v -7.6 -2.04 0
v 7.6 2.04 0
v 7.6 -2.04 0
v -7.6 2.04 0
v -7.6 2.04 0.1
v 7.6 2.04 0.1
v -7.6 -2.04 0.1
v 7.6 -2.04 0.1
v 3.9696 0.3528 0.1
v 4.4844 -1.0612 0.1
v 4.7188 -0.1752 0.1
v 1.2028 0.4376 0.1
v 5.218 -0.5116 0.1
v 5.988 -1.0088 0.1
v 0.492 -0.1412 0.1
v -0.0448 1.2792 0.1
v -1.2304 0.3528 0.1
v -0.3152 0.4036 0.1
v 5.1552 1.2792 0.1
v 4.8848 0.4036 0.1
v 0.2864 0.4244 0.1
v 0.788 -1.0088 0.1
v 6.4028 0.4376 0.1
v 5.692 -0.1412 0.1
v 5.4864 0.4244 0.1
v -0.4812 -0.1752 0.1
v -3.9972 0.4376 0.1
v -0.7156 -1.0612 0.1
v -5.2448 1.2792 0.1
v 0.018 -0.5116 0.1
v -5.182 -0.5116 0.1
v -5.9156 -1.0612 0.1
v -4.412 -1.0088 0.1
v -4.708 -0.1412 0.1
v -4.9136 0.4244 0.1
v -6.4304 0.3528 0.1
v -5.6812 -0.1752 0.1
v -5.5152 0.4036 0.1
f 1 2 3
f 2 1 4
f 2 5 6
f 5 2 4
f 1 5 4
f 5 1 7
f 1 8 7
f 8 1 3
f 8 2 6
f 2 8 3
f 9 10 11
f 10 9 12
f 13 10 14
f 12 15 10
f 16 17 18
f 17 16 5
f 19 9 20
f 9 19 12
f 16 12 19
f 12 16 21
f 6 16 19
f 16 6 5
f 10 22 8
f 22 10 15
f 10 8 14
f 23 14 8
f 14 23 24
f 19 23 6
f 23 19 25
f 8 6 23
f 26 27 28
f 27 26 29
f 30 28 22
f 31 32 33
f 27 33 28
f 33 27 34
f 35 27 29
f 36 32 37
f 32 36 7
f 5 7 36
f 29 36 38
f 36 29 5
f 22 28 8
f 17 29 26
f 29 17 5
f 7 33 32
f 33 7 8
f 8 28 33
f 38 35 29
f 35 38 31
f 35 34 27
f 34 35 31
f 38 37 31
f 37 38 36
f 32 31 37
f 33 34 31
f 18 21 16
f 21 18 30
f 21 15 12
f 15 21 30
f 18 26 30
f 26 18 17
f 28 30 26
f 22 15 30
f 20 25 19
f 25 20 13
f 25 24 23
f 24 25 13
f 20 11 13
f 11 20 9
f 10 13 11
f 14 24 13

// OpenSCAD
// file: ../p/4-4edge.scad
use <../lib.scad>
$fa=1; $fs=0.2;
function ldraw_lib__4_4edge(realsolid=false) = [
// 0 Circle 1.0
// 0 Name: 4-4edge.dat
// 0 Author: James Jessiman
// 0 !LDRAW_ORG Primitive UPDATE 2017-01
// 0 !LICENSE Licensed under CC BY 2.0 and CC BY 4.0 : see CAreadme.txt
// 
// 0 BFC CERTIFY CCW
  [0,"BFC","CERTIFY"],
  [0,"BFC","CCW"],
// 
// 0 !HISTORY 1998-12-15 [PTadmin] Official Update 1998-10
// 0 !HISTORY 2005-12-28 [PTadmin] Official Update 2005-01
// 0 !HISTORY 2007-06-24 [PTadmin] Header formatted for Contributor Agreement
// 0 !HISTORY 2008-07-01 [PTadmin] Official Update 2008-01
// 0 !HISTORY 2017-01-15 [Steffen] BFCed
// 0 !HISTORY 2017-12-30 [PTadmin] Official Update 2017-01
// 
// 
// 2 24 1 0 0 0.9239 0 0.3827
  [2,24,1,0,0,0.9239,0,0.3827],
// 2 24 0.9239 0 0.3827 0.7071 0 0.7071
  [2,24,0.9239,0,0.3827,0.7071,0,0.7071],
// 2 24 0.7071 0 0.7071 0.3827 0 0.9239
  [2,24,0.7071,0,0.7071,0.3827,0,0.9239],
// 2 24 0.3827 0 0.9239 0 0 1
  [2,24,0.3827,0,0.9239,0,0,1],
// 2 24 0 0 1 -0.3827 0 0.9239
  [2,24,0,0,1,-0.3827,0,0.9239],
// 2 24 -0.3827 0 0.9239 -0.7071 0 0.7071
  [2,24,-0.3827,0,0.9239,-0.7071,0,0.7071],
// 2 24 -0.7071 0 0.7071 -0.9239 0 0.3827
  [2,24,-0.7071,0,0.7071,-0.9239,0,0.3827],
// 2 24 -0.9239 0 0.3827 -1 0 -0
  [2,24,-0.9239,0,0.3827,-1,0,-0],
// 2 24 -1 0 -0 -0.9239 0 -0.3827
  [2,24,-1,0,-0,-0.9239,0,-0.3827],
// 2 24 -0.9239 0 -0.3827 -0.7071 0 -0.7071
  [2,24,-0.9239,0,-0.3827,-0.7071,0,-0.7071],
// 2 24 -0.7071 0 -0.7071 -0.3827 0 -0.9239
  [2,24,-0.7071,0,-0.7071,-0.3827,0,-0.9239],
// 2 24 -0.3827 0 -0.9239 0 0 -1
  [2,24,-0.3827,0,-0.9239,0,0,-1],
// 2 24 0 0 -1 0.3827 0 -0.9239
  [2,24,0,0,-1,0.3827,0,-0.9239],
// 2 24 0.3827 0 -0.9239 0.7071 0 -0.7071
  [2,24,0.3827,0,-0.9239,0.7071,0,-0.7071],
// 2 24 0.7071 0 -0.7071 0.9239 0 -0.3827
  [2,24,0.7071,0,-0.7071,0.9239,0,-0.3827],
// 2 24 0.9239 0 -0.3827 1 0 0
  [2,24,0.9239,0,-0.3827,1,0,0],
];
module ldraw_lib__4_4edge(step=0, col=false, unit=2/5, alt=false, line=0.2, solid=!$preview)
    makepoly(ldraw_lib__4_4edge(solid), step=step, col=col, unit=unit, alt=alt, line=line, solid=solid);
ldraw_lib__4_4edge(line=0.2);
// file: ../p/4-4disc.scad
use <../lib.scad>
$fa=1; $fs=0.2;
function ldraw_lib__4_4disc(realsolid=false) = [
// 0 Disc 1.0
// 0 Name: 4-4disc.dat
// 0 Author: James Jessiman
// 0 !LDRAW_ORG Primitive UPDATE 2002-02
// 0 !LICENSE Licensed under CC BY 2.0 and CC BY 4.0 : see CAreadme.txt
// 
// 0 BFC CERTIFY CCW
  [0,"BFC","CERTIFY"],
  [0,"BFC","CCW"],
// 
// 0 !HISTORY 1998-12-15 [PTadmin] Official Update 1998-10
// 0 !HISTORY 2002-03-23 [sbliss] Added BFC statement
// 0 !HISTORY 2002-04-25 [PTadmin] Official Update 2002-02
// 0 !HISTORY 2007-06-24 [PTadmin] Header formatted for Contributor Agreement
// 0 !HISTORY 2008-07-01 [PTadmin] Official Update 2008-01
// 
// 
// 3 16 0 0 0 1 0 0 0.9239 0 0.3827
  [3,16,0,0,0,1,0,0,0.9239,0,0.3827],
// 3 16 0 0 0 0.9239 0 0.3827 0.7071 0 0.7071
  [3,16,0,0,0,0.9239,0,0.3827,0.7071,0,0.7071],
// 3 16 0 0 0 0.7071 0 0.7071 0.3827 0 0.9239
  [3,16,0,0,0,0.7071,0,0.7071,0.3827,0,0.9239],
// 3 16 0 0 0 0.3827 0 0.9239 0 0 1
  [3,16,0,0,0,0.3827,0,0.9239,0,0,1],
// 3 16 0 0 0 0 0 1 -0.3827 0 0.9239
  [3,16,0,0,0,0,0,1,-0.3827,0,0.9239],
// 3 16 0 0 0 -0.3827 0 0.9239 -0.7071 0 0.7071
  [3,16,0,0,0,-0.3827,0,0.9239,-0.7071,0,0.7071],
// 3 16 0 0 0 -0.7071 0 0.7071 -0.9239 0 0.3827
  [3,16,0,0,0,-0.7071,0,0.7071,-0.9239,0,0.3827],
// 3 16 0 0 0 -0.9239 0 0.3827 -1 0 -0
  [3,16,0,0,0,-0.9239,0,0.3827,-1,0,-0],
// 3 16 0 0 0 -1 0 -0 -0.9239 0 -0.3827
  [3,16,0,0,0,-1,0,-0,-0.9239,0,-0.3827],
// 3 16 0 0 0 -0.9239 0 -0.3827 -0.7071 0 -0.7071
  [3,16,0,0,0,-0.9239,0,-0.3827,-0.7071,0,-0.7071],
// 3 16 0 0 0 -0.7071 0 -0.7071 -0.3827 0 -0.9239
  [3,16,0,0,0,-0.7071,0,-0.7071,-0.3827,0,-0.9239],
// 3 16 0 0 0 -0.3827 0 -0.9239 0 0 -1
  [3,16,0,0,0,-0.3827,0,-0.9239,0,0,-1],
// 3 16 0 0 0 0 0 -1 0.3827 0 -0.9239
  [3,16,0,0,0,0,0,-1,0.3827,0,-0.9239],
// 3 16 0 0 0 0.3827 0 -0.9239 0.7071 0 -0.7071
  [3,16,0,0,0,0.3827,0,-0.9239,0.7071,0,-0.7071],
// 3 16 0 0 0 0.7071 0 -0.7071 0.9239 0 -0.3827
  [3,16,0,0,0,0.7071,0,-0.7071,0.9239,0,-0.3827],
// 3 16 0 0 0 0.9239 0 -0.3827 1 0 0
  [3,16,0,0,0,0.9239,0,-0.3827,1,0,0],
// 0
];
module ldraw_lib__4_4disc(step=0, col=false, unit=2/5, alt=false, line=0.2, solid=!$preview)
    makepoly(ldraw_lib__4_4disc(solid), step=step, col=col, unit=unit, alt=alt, line=line, solid=solid);
ldraw_lib__4_4disc(line=0.2);
// file: ../p/4-4cyli.scad
use <../lib.scad>
$fa=1; $fs=0.2;
function ldraw_lib__4_4cyli(realsolid=false) = [
// 0 Cylinder 1.0
// 0 Name: 4-4cyli.dat
// 0 Author: James Jessiman
// 0 !LDRAW_ORG Primitive UPDATE 2005-01
// 0 !LICENSE Licensed under CC BY 2.0 and CC BY 4.0 : see CAreadme.txt
// 
// 0 BFC CERTIFY CCW
  [0,"BFC","CERTIFY"],
  [0,"BFC","CCW"],
// 
// 0 !HISTORY 1998-12-15 [PTadmin] Official Update 1998-10
// 0 !HISTORY 2002-03-23 [sbliss] Added BFC statement; merged headers from files in distributions LDraw 0.27 and Complete.
// 0 !HISTORY 2002-04-25 [PTadmin] Official Update 2002-02
// 0 !HISTORY 2004-12-14 [guyvivan] BFC CCW
// 0 !HISTORY 2005-12-28 [PTadmin] Official Update 2005-01
// 0 !HISTORY 2007-06-24 [PTadmin] Header formatted for Contributor Agreement
// 0 !HISTORY 2008-07-01 [PTadmin] Official Update 2008-01
// 
// 
// 4 16 1 1 0 0.9239 1 0.3827 0.9239 0 0.3827 1 0 0
  [4,16,1,1,0,0.9239,1,0.3827,0.9239,0,0.3827,1,0,0],
// 5 24 1 0 0 1 1 0 0.9239 0 0.3827 0.9239 0 -0.3827
  [5,24,1,0,0,1,1,0,0.9239,0,0.3827,0.9239,0,-0.3827],
// 4 16 0.9239 1 0.3827 0.7071 1 0.7071 0.7071 0 0.7071 0.9239 0 0.3827
  [4,16,0.9239,1,0.3827,0.7071,1,0.7071,0.7071,0,0.7071,0.9239,0,0.3827],
// 5 24 0.9239 0 0.3827 0.9239 1 0.3827 0.7071 0 0.7071 1 0 0
  [5,24,0.9239,0,0.3827,0.9239,1,0.3827,0.7071,0,0.7071,1,0,0],
// 4 16 0.7071 1 0.7071 0.3827 1 0.9239 0.3827 0 0.9239 0.7071 0 0.7071
  [4,16,0.7071,1,0.7071,0.3827,1,0.9239,0.3827,0,0.9239,0.7071,0,0.7071],
// 5 24 0.7071 0 0.7071 0.7071 1 0.7071 0.3827 0 0.9239 0.9239 0 0.3827
  [5,24,0.7071,0,0.7071,0.7071,1,0.7071,0.3827,0,0.9239,0.9239,0,0.3827],
// 4 16 0.3827 1 0.9239 0 1 1 0 0 1 0.3827 0 0.9239
  [4,16,0.3827,1,0.9239,0,1,1,0,0,1,0.3827,0,0.9239],
// 5 24 0.3827 0 0.9239 0.3827 1 0.9239 0 0 1 0.7071 0 0.7071
  [5,24,0.3827,0,0.9239,0.3827,1,0.9239,0,0,1,0.7071,0,0.7071],
// 4 16 0 1 1 -0.3827 1 0.9239 -0.3827 0 0.9239 0 0 1
  [4,16,0,1,1,-0.3827,1,0.9239,-0.3827,0,0.9239,0,0,1],
// 5 24 0 0 1 0 1 1 -0.3827 0 0.9239 0.3827 0 0.9239
  [5,24,0,0,1,0,1,1,-0.3827,0,0.9239,0.3827,0,0.9239],
// 4 16 -0.3827 1 0.9239 -0.7071 1 0.7071 -0.7071 0 0.7071 -0.3827 0 0.9239
  [4,16,-0.3827,1,0.9239,-0.7071,1,0.7071,-0.7071,0,0.7071,-0.3827,0,0.9239],
// 5 24 -0.3827 0 0.9239 -0.3827 1 0.9239 -0.7071 0 0.7071 0 0 1
  [5,24,-0.3827,0,0.9239,-0.3827,1,0.9239,-0.7071,0,0.7071,0,0,1],
// 4 16 -0.7071 1 0.7071 -0.9239 1 0.3827 -0.9239 0 0.3827 -0.7071 0 0.7071
  [4,16,-0.7071,1,0.7071,-0.9239,1,0.3827,-0.9239,0,0.3827,-0.7071,0,0.7071],
// 5 24 -0.7071 0 0.7071 -0.7071 1 0.7071 -0.9239 0 0.3827 -0.3827 0 0.9239
  [5,24,-0.7071,0,0.7071,-0.7071,1,0.7071,-0.9239,0,0.3827,-0.3827,0,0.9239],
// 4 16 -0.9239 1 0.3827 -1 1 0 -1 0 0 -0.9239 0 0.3827
  [4,16,-0.9239,1,0.3827,-1,1,0,-1,0,0,-0.9239,0,0.3827],
// 5 24 -0.9239 0 0.3827 -0.9239 1 0.3827 -1 0 0 -0.7071 0 0.7071
  [5,24,-0.9239,0,0.3827,-0.9239,1,0.3827,-1,0,0,-0.7071,0,0.7071],
// 4 16 -1 1 0 -0.9239 1 -0.3827 -0.9239 0 -0.3827 -1 0 0
  [4,16,-1,1,0,-0.9239,1,-0.3827,-0.9239,0,-0.3827,-1,0,0],
// 5 24 -1 0 0 -1 1 0 -0.9239 0 -0.3827 -0.9239 0 0.3827
  [5,24,-1,0,0,-1,1,0,-0.9239,0,-0.3827,-0.9239,0,0.3827],
// 4 16 -0.9239 1 -0.3827 -0.7071 1 -0.7071 -0.7071 0 -0.7071 -0.9239 0 -0.3827
  [4,16,-0.9239,1,-0.3827,-0.7071,1,-0.7071,-0.7071,0,-0.7071,-0.9239,0,-0.3827],
// 5 24 -0.9239 0 -0.3827 -0.9239 1 -0.3827 -0.7071 0 -0.7071 -1 0 0
  [5,24,-0.9239,0,-0.3827,-0.9239,1,-0.3827,-0.7071,0,-0.7071,-1,0,0],
// 4 16 -0.7071 1 -0.7071 -0.3827 1 -0.9239 -0.3827 0 -0.9239 -0.7071 0 -0.7071
  [4,16,-0.7071,1,-0.7071,-0.3827,1,-0.9239,-0.3827,0,-0.9239,-0.7071,0,-0.7071],
// 5 24 -0.7071 0 -0.7071 -0.7071 1 -0.7071 -0.3827 0 -0.9239 -0.9239 0 -0.3827
  [5,24,-0.7071,0,-0.7071,-0.7071,1,-0.7071,-0.3827,0,-0.9239,-0.9239,0,-0.3827],
// 4 16 -0.3827 1 -0.9239 0 1 -1 0 0 -1 -0.3827 0 -0.9239
  [4,16,-0.3827,1,-0.9239,0,1,-1,0,0,-1,-0.3827,0,-0.9239],
// 5 24 -0.3827 0 -0.9239 -0.3827 1 -0.9239 0 0 -1 -0.7071 0 -0.7071
  [5,24,-0.3827,0,-0.9239,-0.3827,1,-0.9239,0,0,-1,-0.7071,0,-0.7071],
// 4 16 0 1 -1 0.3827 1 -0.9239 0.3827 0 -0.9239 0 0 -1
  [4,16,0,1,-1,0.3827,1,-0.9239,0.3827,0,-0.9239,0,0,-1],
// 5 24 0 0 -1 0 1 -1 0.3827 0 -0.9239 -0.3827 0 -0.9239
  [5,24,0,0,-1,0,1,-1,0.3827,0,-0.9239,-0.3827,0,-0.9239],
// 4 16 0.3827 1 -0.9239 0.7071 1 -0.7071 0.7071 0 -0.7071 0.3827 0 -0.9239
  [4,16,0.3827,1,-0.9239,0.7071,1,-0.7071,0.7071,0,-0.7071,0.3827,0,-0.9239],
// 5 24 0.3827 0 -0.9239 0.3827 1 -0.9239 0.7071 0 -0.7071 0 0 -1
  [5,24,0.3827,0,-0.9239,0.3827,1,-0.9239,0.7071,0,-0.7071,0,0,-1],
// 4 16 0.7071 1 -0.7071 0.9239 1 -0.3827 0.9239 0 -0.3827 0.7071 0 -0.7071
  [4,16,0.7071,1,-0.7071,0.9239,1,-0.3827,0.9239,0,-0.3827,0.7071,0,-0.7071],
// 5 24 0.7071 0 -0.7071 0.7071 1 -0.7071 0.9239 0 -0.3827 0.3827 0 -0.9239
  [5,24,0.7071,0,-0.7071,0.7071,1,-0.7071,0.9239,0,-0.3827,0.3827,0,-0.9239],
// 4 16 0.9239 1 -0.3827 1 1 0 1 0 0 0.9239 0 -0.3827
  [4,16,0.9239,1,-0.3827,1,1,0,1,0,0,0.9239,0,-0.3827],
// 5 24 0.9239 0 -0.3827 0.9239 1 -0.3827 1 0 0 0.7071 0 -0.7071
  [5,24,0.9239,0,-0.3827,0.9239,1,-0.3827,1,0,0,0.7071,0,-0.7071],
// 0
];
module ldraw_lib__4_4cyli(step=0, col=false, unit=2/5, alt=false, line=0.2, solid=!$preview)
    makepoly(ldraw_lib__4_4cyli(solid), step=step, col=col, unit=unit, alt=alt, line=line, solid=solid);
ldraw_lib__4_4cyli(line=0.2);
// file: ../p/stud3.scad
use <../lib.scad>
use <4-4cyli.scad>
use <4-4disc.scad>
use <4-4edge.scad>
$fa=1; $fs=0.2;
function ldraw_lib__stud3(realsolid=false) = realsolid ? 
    [openscad(translate([0,0,-eps()], o=cylinder(4+eps(), r=4)),2)] : [
// 0 Stud Tube Solid
// 0 Name: stud3.dat
// 0 Author: James Jessiman
// 0 !LDRAW_ORG Primitive UPDATE 2012-01
// 0 !LICENSE Licensed under CC BY 2.0 and CC BY 4.0 : see CAreadme.txt
// 
// 0 BFC CERTIFY CCW
  [0,"BFC","CERTIFY"],
  [0,"BFC","CCW"],
// 
// 0 !HISTORY 2002-04-04 [sbliss] Modified for BFC compliance
// 0 !HISTORY 2002-04-25 [PTadmin] Official Update 2002-02
// 0 !HISTORY 2007-06-24 [PTadmin] Header formatted for Contributor Agreement
// 0 !HISTORY 2008-07-01 [PTadmin] Official Update 2008-01
// 0 !HISTORY 2012-02-16 [Philo] Changed to CCW
// 0 !HISTORY 2012-03-30 [PTadmin] Official Update 2012-01
// 
// 
// 1 16 0 -4 0 4 0 0 0 1 0 0 0 4 4-4edge.dat
  [1,16,0,-4,0,4,0,0,0,1,0,0,0,4, ldraw_lib__4_4edge(realsolid)],
// 1 16 0 0 0 4 0 0 0 1 0 0 0 4 4-4edge.dat
  [1,16,0,0,0,4,0,0,0,1,0,0,0,4, ldraw_lib__4_4edge(realsolid)],
// 1 16 0 -4 0 4 0 0 0 1 0 0 0 4 4-4disc.dat
  [1,16,0,-4,0,4,0,0,0,1,0,0,0,4, ldraw_lib__4_4disc(realsolid)],
// 1 16 0 -4 0 4 0 0 0 4 0 0 0 4 4-4cyli.dat
  [1,16,0,-4,0,4,0,0,0,4,0,0,0,4, ldraw_lib__4_4cyli(realsolid)],
];
module ldraw_lib__stud3(step=0, col=false, unit=2/5, alt=false, line=0.2, solid=!$preview)
    makepoly(ldraw_lib__stud3(solid), step=step, col=col, unit=unit, alt=alt, line=line, solid=solid);
ldraw_lib__stud3(line=0.2);
// file: ../p/stud.scad
use <../lib.scad>
use <4-4cyli.scad>
use <4-4disc.scad>
use <4-4edge.scad>
$fa=1; $fs=0.2;
function ldraw_lib__stud(realsolid=false) = realsolid ? 
    [openscad(translate([0,0,-eps()], o=cylinder(4+eps(), r=6)),2)] : [
// 0 Stud
// 0 Name: stud.dat
// 0 Author: James Jessiman
// 0 !LDRAW_ORG Primitive UPDATE 2012-01
// 0 !LICENSE Licensed under CC BY 2.0 and CC BY 4.0 : see CAreadme.txt
// 
// 0 BFC CERTIFY CCW
  [0,"BFC","CERTIFY"],
  [0,"BFC","CCW"],
// 
// 0 !HISTORY 2002-04-04 [sbliss] Modified for BFC compliance
// 0 !HISTORY 2002-04-25 [PTadmin] Official Update 2002-02
// 0 !HISTORY 2007-06-24 [PTadmin] Header formatted for Contributor Agreement
// 0 !HISTORY 2008-07-01 [PTadmin] Official Update 2008-01
// 0 !HISTORY 2012-02-16 [Philo] Changed to CCW
// 0 !HISTORY 2012-03-30 [PTadmin] Official Update 2012-01
// 
// 
// 1 16 0 0 0 6 0 0 0 1 0 0 0 6 4-4edge.dat
  [1,16,0,0,0,6,0,0,0,1,0,0,0,6, ldraw_lib__4_4edge(realsolid)],
// 1 16 0 -4 0 6 0 0 0 1 0 0 0 6 4-4edge.dat
  [1,16,0,-4,0,6,0,0,0,1,0,0,0,6, ldraw_lib__4_4edge(realsolid)],
// 1 16 0 0 0 6 0 0 0 -4 0 0 0 6 4-4cyli.dat
  [1,16,0,0,0,6,0,0,0,-4,0,0,0,6, ldraw_lib__4_4cyli(realsolid)],
// 1 16 0 -4 0 6 0 0 0 1 0 0 0 6 4-4disc.dat
  [1,16,0,-4,0,6,0,0,0,1,0,0,0,6, ldraw_lib__4_4disc(realsolid)],
];
module ldraw_lib__stud(step=0, col=false, unit=2/5, alt=false, line=0.2, solid=!$preview)
    makepoly(ldraw_lib__stud(solid), step=step, col=col, unit=unit, alt=alt, line=line, solid=solid);
ldraw_lib__stud(line=0.2);
// file: ../p/box5.scad
use <../lib.scad>
$fa=1; $fs=0.2;
function ldraw_lib__box5(realsolid=false) = [
// 0 Box with 5 Faces and All Edges
// 0 Name: box5.dat
// 0 Author: James Jessiman
// 0 !LDRAW_ORG Primitive UPDATE 2012-01
// 0 !LICENSE Licensed under CC BY 2.0 and CC BY 4.0 : see CAreadme.txt
// 
// 0 BFC CERTIFY CCW
  [0,"BFC","CERTIFY"],
  [0,"BFC","CCW"],
// 
// 0 !HISTORY 2002-04-03 [sbliss] Modified for BFC compliance
// 0 !HISTORY 2002-04-25 [PTadmin] Official Update 2002-02
// 0 !HISTORY 2007-06-24 [PTadmin] Header formatted for Contributor Agreement
// 0 !HISTORY 2008-07-01 [PTadmin] Official Update 2008-01
// 0 !HISTORY 2012-02-16 [Philo] Changed to CCW
// 0 !HISTORY 2012-03-30 [PTadmin] Official Update 2012-01
// 
// 
// 2 24 1 1 1 -1 1 1
  [2,24,1,1,1,-1,1,1],
// 2 24 -1 1 1 -1 1 -1
  [2,24,-1,1,1,-1,1,-1],
// 2 24 -1 1 -1 1 1 -1
  [2,24,-1,1,-1,1,1,-1],
// 2 24 1 1 -1 1 1 1
  [2,24,1,1,-1,1,1,1],
// 2 24 1 0 1 -1 0 1
  [2,24,1,0,1,-1,0,1],
// 2 24 -1 0 1 -1 0 -1
  [2,24,-1,0,1,-1,0,-1],
// 2 24 -1 0 -1 1 0 -1
  [2,24,-1,0,-1,1,0,-1],
// 2 24 1 0 -1 1 0 1
  [2,24,1,0,-1,1,0,1],
// 2 24 1 0 1 1 1 1
  [2,24,1,0,1,1,1,1],
// 2 24 -1 0 1 -1 1 1
  [2,24,-1,0,1,-1,1,1],
// 2 24 1 0 -1 1 1 -1
  [2,24,1,0,-1,1,1,-1],
// 2 24 -1 0 -1 -1 1 -1
  [2,24,-1,0,-1,-1,1,-1],
// 4 16 -1 1 1 1 1 1 1 1 -1 -1 1 -1
  [4,16,-1,1,1,1,1,1,1,1,-1,-1,1,-1],
// 4 16 -1 1 1 -1 0 1 1 0 1 1 1 1
  [4,16,-1,1,1,-1,0,1,1,0,1,1,1,1],
// 4 16 -1 1 -1 -1 0 -1 -1 0 1 -1 1 1
  [4,16,-1,1,-1,-1,0,-1,-1,0,1,-1,1,1],
// 4 16 1 1 -1 1 0 -1 -1 0 -1 -1 1 -1
  [4,16,1,1,-1,1,0,-1,-1,0,-1,-1,1,-1],
// 4 16 1 1 1 1 0 1 1 0 -1 1 1 -1
  [4,16,1,1,1,1,0,1,1,0,-1,1,1,-1],
];
module ldraw_lib__box5(step=0, col=false, unit=2/5, alt=false, line=0.2, solid=!$preview)
    makepoly(ldraw_lib__box5(solid), step=step, col=col, unit=unit, alt=alt, line=line, solid=solid);
ldraw_lib__box5(line=0.2);
// file: ../p/box4t.scad
use <../lib.scad>
$fa=1; $fs=0.2;
function ldraw_lib__box4t(realsolid=false) = [
// 0 Box with 4 Adjacent Faces and All Edges
// 0 Name: box4t.dat
// 0 Author: Tore Eriksson [Tore_Eriksson]
// 0 !LDRAW_ORG Primitive UPDATE 2003-02
// 0 !LICENSE Licensed under CC BY 2.0 and CC BY 4.0 : see CAreadme.txt
// 
// 0 BFC CERTIFY CCW
  [0,"BFC","CERTIFY"],
  [0,"BFC","CCW"],
// 
// 0 !HISTORY 1997-09-29 [PTadmin] Official Update 1997-15
// 0 !HISTORY 2002-08-31 [izanette] Modified with WINDZ for BFC compliance
// 0 !HISTORY 2003-08-01 [PTadmin] Official Update 2003-02
// 0 !HISTORY 2007-06-24 [PTadmin] Header formatted for Contributor Agreement
// 0 !HISTORY 2008-07-01 [PTadmin] Official Update 2008-01
// 
// 
// 2 24 1 1 1 -1 1 1
  [2,24,1,1,1,-1,1,1],
// 2 24 -1 1 1 -1 1 -1
  [2,24,-1,1,1,-1,1,-1],
// 2 24 -1 1 -1 1 1 -1
  [2,24,-1,1,-1,1,1,-1],
// 2 24 1 1 -1 1 1 1
  [2,24,1,1,-1,1,1,1],
// 2 24 1 0 1 -1 0 1
  [2,24,1,0,1,-1,0,1],
// 2 24 -1 0 1 -1 0 -1
  [2,24,-1,0,1,-1,0,-1],
// 2 24 -1 0 -1 1 0 -1
  [2,24,-1,0,-1,1,0,-1],
// 2 24 1 0 -1 1 0 1
  [2,24,1,0,-1,1,0,1],
// 2 24 1 0 1 1 1 1
  [2,24,1,0,1,1,1,1],
// 2 24 -1 0 1 -1 1 1
  [2,24,-1,0,1,-1,1,1],
// 2 24 1 0 -1 1 1 -1
  [2,24,1,0,-1,1,1,-1],
// 2 24 -1 0 -1 -1 1 -1
  [2,24,-1,0,-1,-1,1,-1],
// 4 16 1 1 1 1 1 -1 -1 1 -1 -1 1 1
  [4,16,1,1,1,1,1,-1,-1,1,-1,-1,1,1],
// 4 16 1 1 1 -1 1 1 -1 0 1 1 0 1
  [4,16,1,1,1,-1,1,1,-1,0,1,1,0,1],
// 4 16 -1 1 1 -1 1 -1 -1 0 -1 -1 0 1
  [4,16,-1,1,1,-1,1,-1,-1,0,-1,-1,0,1],
// 0 4 16 -1 1 -1 -1 0 -1 1 0 -1 1 1 -1
// 4 16 1 1 -1 1 1 1 1 0 1 1 0 -1
  [4,16,1,1,-1,1,1,1,1,0,1,1,0,-1],
// 0
];
module ldraw_lib__box4t(step=0, col=false, unit=2/5, alt=false, line=0.2, solid=!$preview)
    makepoly(ldraw_lib__box4t(solid), step=step, col=col, unit=unit, alt=alt, line=line, solid=solid);
ldraw_lib__box4t(line=0.2);
// file: s/3004s01.scad
use <../../lib.scad>
use <../../p/box4t.scad>
use <../../p/box5.scad>
use <../../p/stud.scad>
use <../../p/stud3.scad>
$fa=1; $fs=0.2;
function ldraw_lib__s__3004s01(realsolid=false) = [
// 0 ~Brick  1 x  2 without Front Face
// 0 Name: s\3004s01.dat
// 0 Author: James Jessiman
// 0 !LDRAW_ORG Subpart UPDATE 2003-03
// 0 !LICENSE Licensed under CC BY 2.0 and CC BY 4.0 : see CAreadme.txt
// 
// 0 BFC CERTIFY CCW
  [0,"BFC","CERTIFY"],
  [0,"BFC","CCW"],
// 
// 0 !HISTORY 2003-09-07 [jriley] Subfiling, BFC
// 0 !HISTORY 2003-12-19 [PTadmin] Official Update 2003-03
// 0 !HISTORY 2007-08-29 [PTadmin] Header formatted for Contributor Agreement
// 0 !HISTORY 2008-07-01 [PTadmin] Official Update 2008-01
// 
// 
// 1 16 0 4 0 1 0 0 0 -5 0 0 0 1 stud3.dat
  [1,16,0,4,0,1,0,0,0,-5,0,0,0,1, ldraw_lib__stud3(realsolid)],
// 0 BFC INVERTNEXT
  [0,"BFC","INVERTNEXT"],
// 1 16 0 24 0 16 0 0 0 -20 0 0 0 6 box5.dat
  [1,16,0,24,0,16,0,0,0,-20,0,0,0,6, ldraw_lib__box5(realsolid)],
// 4 16 20 24 10 16 24 6 -16 24 6 -20 24 10
  [4,16,20,24,10,16,24,6,-16,24,6,-20,24,10],
// 4 16 -20 24 10 -16 24 6 -16 24 -6 -20 24 -10
  [4,16,-20,24,10,-16,24,6,-16,24,-6,-20,24,-10],
// 4 16 -20 24 -10 -16 24 -6 16 24 -6 20 24 -10
  [4,16,-20,24,-10,-16,24,-6,16,24,-6,20,24,-10],
// 4 16 20 24 -10 16 24 -6 16 24 6 20 24 10
  [4,16,20,24,-10,16,24,-6,16,24,6,20,24,10],
// 1 16 0 24 0 20 0 0 0 -24 0 0 0 10 box4t.dat
  [1,16,0,24,0,20,0,0,0,-24,0,0,0,10, ldraw_lib__box4t(realsolid)],
// 1 16 10 0 0 1 0 0 0 1 0 0 0 1 stud.dat
  [1,16,10,0,0,1,0,0,0,1,0,0,0,1, ldraw_lib__stud(realsolid)],
// 1 16 -10 0 0 1 0 0 0 1 0 0 0 1 stud.dat
  [1,16,-10,0,0,1,0,0,0,1,0,0,0,1, ldraw_lib__stud(realsolid)],
// 0
];
module ldraw_lib__s__3004s01(step=0, col=false, unit=2/5, alt=false, line=0.2, solid=!$preview)
    makepoly(ldraw_lib__s__3004s01(solid), step=step, col=col, unit=unit, alt=alt, line=line, solid=solid);
ldraw_lib__s__3004s01(line=0.2);
// file: 3004.scad
use <../lib.scad>
use <s/3004s01.scad>
$fa=1; $fs=0.2;
function ldraw_lib__3004(realsolid=false) = [
// 0 Brick  1 x  2
// 0 Name: 3004.dat
// 0 Author: James Jessiman
// 0 !LDRAW_ORG Part UPDATE 2022-05
// 0 !LICENSE Licensed under CC BY 2.0 and CC BY 4.0 : see CAreadme.txt
// 
// 0 BFC CERTIFY CCW
  [0,"BFC","CERTIFY"],
  [0,"BFC","CCW"],
// 
// 0 !HISTORY 2001-10-26 [PTadmin] Official Update 2001-01
// 0 !HISTORY 2002-05-07 {unknown} BFC Certification
// 0 !HISTORY 2002-06-11 [PTadmin] Official Update 2002-03
// 0 !HISTORY 2007-05-07 [PTadmin] Header formatted for Contributor Agreement
// 0 !HISTORY 2008-07-01 [PTadmin] Official Update 2008-01
// 0 !HISTORY 2022-08-04 [MagFors] Using subfile
// 0 !HISTORY 2022-09-15 [PTadmin] Official Update 2022-05
// 
// 
// 1 16 0 0 0 1 0 0 0 1 0 0 0 1 s\3004s01.dat
  [1,16,0,0,0,1,0,0,0,1,0,0,0,1, ldraw_lib__s__3004s01(realsolid)],
// 4 16 -20 24 -10 20 24 -10 20 0 -10 -20 0 -10
  [4,16,-20,24,-10,20,24,-10,20,0,-10,-20,0,-10],
];
module ldraw_lib__3004(step=0, col=false, unit=2/5, alt=false, line=0.2, solid=!$preview)
    makepoly(ldraw_lib__3004(solid), step=step, col=col, unit=unit, alt=alt, line=line, solid=solid);
ldraw_lib__3004(line=0.2);
// file: ../p/box5-12.scad
use <../lib.scad>
$fa=1; $fs=0.2;
function ldraw_lib__box5_12(realsolid=false) = [
// 0 Box with 5 Faces without Any Edges
// 0 Name: box5-12.dat
// 0 Author: Chris Dee [cwdee]
// 0 !LDRAW_ORG Primitive UPDATE 2009-02
// 0 !LICENSE Licensed under CC BY 2.0 and CC BY 4.0 : see CAreadme.txt
// 
// 0 BFC CERTIFY CCW
  [0,"BFC","CERTIFY"],
  [0,"BFC","CCW"],
// 
// 0 !HISTORY 2009-09-03 [PTadmin] Official Update 2009-02
// 
// 
// 4 16 1 1 1 1 1 -1 -1 1 -1 -1 1 1
  [4,16,1,1,1,1,1,-1,-1,1,-1,-1,1,1],
// 4 16 -1 0 1 1 0 1 1 1 1 -1 1 1
  [4,16,-1,0,1,1,0,1,1,1,1,-1,1,1],
// 4 16 -1 0 -1 -1 0 1 -1 1 1 -1 1 -1
  [4,16,-1,0,-1,-1,0,1,-1,1,1,-1,1,-1],
// 4 16 1 0 -1 -1 0 -1 -1 1 -1 1 1 -1
  [4,16,1,0,-1,-1,0,-1,-1,1,-1,1,1,-1],
// 4 16 1 0 1 1 0 -1 1 1 -1 1 1 1
  [4,16,1,0,1,1,0,-1,1,1,-1,1,1,1],
// 0
];
module ldraw_lib__box5_12(step=0, col=false, unit=2/5, alt=false, line=0.2, solid=!$preview)
    makepoly(ldraw_lib__box5_12(solid), step=step, col=col, unit=unit, alt=alt, line=line, solid=solid);
ldraw_lib__box5_12(line=0.2);
// main file
use <../lib.scad>
use <../p/box5-12.scad>
$fa=1; $fs=0.2;
function ldraw_lib__168335r(realsolid=false) = [
// 0 Sticker  0.5 x  1.9 with  3 White Stars
// 0 Name: 168335r.dat
// 0 Author: Ulrich Röder [UR]
// 0 !LDRAW_ORG Part UPDATE 2018-02
// 0 !LICENSE Licensed under CC BY 2.0 and CC BY 4.0 : see CAreadme.txt
// 
// 0 BFC CERTIFY CCW
  [0,"BFC","CERTIFY"],
  [0,"BFC","CCW"],
// 
// 0 !KEYWORDS Set 5591
// 
// 0 !HISTORY 2018-12-08 [PTadmin] Official Update 2018-02
// 
// 
// 0 // Main
// 1 16 0 -0.25 0 19 0 0 0 0.25 0 0 0 5.1 box5-12.dat
  [1,16,0,-0.25,0,19,0,0,0,0.25,0,0,0,5.1, ldraw_lib__box5_12(realsolid)],
// 
// 0 // Red
// 4 4 3.007 -.25 1.094 11.211 -.25 -2.653 11.797 -.25 -.438 9.924 -.25 .882
  [4,4,3.007,-.25,1.094,11.211,-.25,-2.653,11.797,-.25,-.438,9.924,-.25,.882],
// 3 4 13.045 -0.25 -1.279 11.211 -0.25 -2.653 14.97 -0.25 -2.522
  [3,4,13.045,-0.25,-1.279,11.211,-0.25,-2.653,14.97,-0.25,-2.522],
// 3 4 3.007 -.25 1.094 1.23 -.25 -.353 11.211 -.25 -2.653
  [3,4,3.007,-.25,1.094,1.23,-.25,-.353,11.211,-.25,-2.653],
// 4 4 -3.076 -.25 .882 -.788 -.25 1.009 -.112 -.25 3.198 -19 -.25 5.1
  [4,4,-3.076,-.25,.882,-.788,-.25,1.009,-.112,-.25,3.198,-19,-.25,5.1],
// 4 4 9.924 -.25 .882 12.212 -.25 1.009 12.888 -.25 3.198 3.007 -.25 1.094
  [4,4,9.924,-.25,.882,12.212,-.25,1.009,12.888,-.25,3.198,3.007,-.25,1.094],
// 4 4 .716 -.25 1.061 3.007 -.25 1.094 12.888 -.25 3.198 -.112 -.25 3.198
  [4,4,.716,-.25,1.061,3.007,-.25,1.094,12.888,-.25,3.198,-.112,-.25,3.198],
// 4 4 -19 -.25 5.1 -.112 -.25 3.198 12.888 -.25 3.198 19 -.25 5.1
  [4,4,-19,-.25,5.1,-.112,-.25,3.198,12.888,-.25,3.198,19,-.25,5.1],
// 4 4 1.97 -.25 -2.522 19 -.25 -5.1 11.211 -.25 -2.653 1.23 -.25 -.353
  [4,4,1.97,-.25,-2.522,19,-.25,-5.1,11.211,-.25,-2.653,1.23,-.25,-.353],
// 3 4 11.211 -0.25 -2.653 19 -0.25 -5.1 14.97 -0.25 -2.522
  [3,4,11.211,-0.25,-2.653,19,-0.25,-5.1,14.97,-0.25,-2.522],
// 4 4 16.007 -.25 1.094 14.23 -.25 -.353 14.97 -.25 -2.522 19 -.25 -5.1
  [4,4,16.007,-.25,1.094,14.23,-.25,-.353,14.97,-.25,-2.522,19,-.25,-5.1],
// 4 4 12.888 -.25 3.198 13.716 -.25 1.061 16.007 -.25 1.094 19 -.25 5.1
  [4,4,12.888,-.25,3.198,13.716,-.25,1.061,16.007,-.25,1.094,19,-.25,5.1],
// 3 4 19 -0.25 -5.1 19 -0.25 5.1 16.007 -0.25 1.094
  [3,4,19,-0.25,-5.1,19,-0.25,5.1,16.007,-0.25,1.094],
// 4 4 -1.203 -.25 -.438 -13.112 -.25 3.198 -9.993 -.25 1.094 -1.789 -.25 -2.653
  [4,4,-1.203,-.25,-.438,-13.112,-.25,3.198,-9.993,-.25,1.094,-1.789,-.25,-2.653],
// 3 4 0.045 -0.25 -1.279 -1.789 -0.25 -2.653 1.97 -0.25 -2.522
  [3,4,0.045,-0.25,-1.279,-1.789,-0.25,-2.653,1.97,-0.25,-2.522],
// 3 4 -12.955 -0.25 -1.279 -14.789 -0.25 -2.653 -11.03 -0.25 -2.522
  [3,4,-12.955,-0.25,-1.279,-14.789,-0.25,-2.653,-11.03,-0.25,-2.522],
// 4 4 -11.77 -.25 -.353 -11.03 -.25 -2.522 -1.789 -.25 -2.653 -9.993 -.25 1.094
  [4,4,-11.77,-.25,-.353,-11.03,-.25,-2.522,-1.789,-.25,-2.653,-9.993,-.25,1.094],
// 3 4 -12.284 -0.25 1.061 -9.993 -0.25 1.094 -13.112 -0.25 3.198
  [3,4,-12.284,-0.25,1.061,-9.993,-0.25,1.094,-13.112,-0.25,3.198],
// 4 4 -14.203 -.25 -.438 -16.076 -.25 .882 -19 -.25 -5.1 -14.789 -.25 -2.653
  [4,4,-14.203,-.25,-.438,-16.076,-.25,.882,-19,-.25,-5.1,-14.789,-.25,-2.653],
// 3 4 -19 -0.25 5.1 -19 -0.25 -5.1 -16.076 -0.25 0.882
  [3,4,-19,-0.25,5.1,-19,-0.25,-5.1,-16.076,-0.25,0.882],
// 4 4 -13.112 -.25 3.198 -19 -.25 5.1 -16.076 -.25 .882 -13.788 -.25 1.009
  [4,4,-13.112,-.25,3.198,-19,-.25,5.1,-16.076,-.25,.882,-13.788,-.25,1.009],
// 3 4 1.97 -0.25 -2.522 -1.789 -0.25 -2.653 19 -0.25 -5.1
  [3,4,1.97,-0.25,-2.522,-1.789,-0.25,-2.653,19,-0.25,-5.1],
// 4 4 -13.112 -.25 3.198 -1.203 -.25 -.438 -3.076 -.25 .882 -19 -.25 5.1
  [4,4,-13.112,-.25,3.198,-1.203,-.25,-.438,-3.076,-.25,.882,-19,-.25,5.1],
// 4 4 -19 -.25 -5.1 19 -.25 -5.1 -11.03 -.25 -2.522 -14.789 -.25 -2.653
  [4,4,-19,-.25,-5.1,19,-.25,-5.1,-11.03,-.25,-2.522,-14.789,-.25,-2.653],
// 3 4 19 -0.25 -5.1 -1.789 -0.25 -2.653 -11.03 -0.25 -2.522
  [3,4,19,-0.25,-5.1,-1.789,-0.25,-2.653,-11.03,-0.25,-2.522],
// 
// 0 // White
// 4 15 -13.112 -.25 3.198 -13.788 -.25 1.009 -12.955 -.25 -1.279 -12.284 -.25 1.061
  [4,15,-13.112,-.25,3.198,-13.788,-.25,1.009,-12.955,-.25,-1.279,-12.284,-.25,1.061],
// 4 15 -9.993 -.25 1.094 -12.284 -.25 1.061 -12.955 -.25 -1.279 -11.77 -.25 -.353
  [4,15,-9.993,-.25,1.094,-12.284,-.25,1.061,-12.955,-.25,-1.279,-11.77,-.25,-.353],
// 4 15 -16.076 -.25 .882 -14.203 -.25 -.438 -12.955 -.25 -1.279 -13.788 -.25 1.009
  [4,15,-16.076,-.25,.882,-14.203,-.25,-.438,-12.955,-.25,-1.279,-13.788,-.25,1.009],
// 3 15 -14.789 -0.25 -2.653 -12.955 -0.25 -1.279 -14.203 -0.25 -0.438
  [3,15,-14.789,-0.25,-2.653,-12.955,-0.25,-1.279,-14.203,-0.25,-0.438],
// 3 15 -11.03 -0.25 -2.522 -11.77 -0.25 -0.353 -12.955 -0.25 -1.279
  [3,15,-11.03,-0.25,-2.522,-11.77,-0.25,-0.353,-12.955,-0.25,-1.279],
// 4 15 -.112 -.25 3.198 -.788 -.25 1.009 .045 -.25 -1.279 .716 -.25 1.061
  [4,15,-.112,-.25,3.198,-.788,-.25,1.009,.045,-.25,-1.279,.716,-.25,1.061],
// 4 15 3.007 -.25 1.094 .716 -.25 1.061 .045 -.25 -1.279 1.23 -.25 -.353
  [4,15,3.007,-.25,1.094,.716,-.25,1.061,.045,-.25,-1.279,1.23,-.25,-.353],
// 4 15 -3.076 -.25 .882 -1.203 -.25 -.438 .045 -.25 -1.279 -.788 -.25 1.009
  [4,15,-3.076,-.25,.882,-1.203,-.25,-.438,.045,-.25,-1.279,-.788,-.25,1.009],
// 3 15 -1.789 -0.25 -2.653 0.045 -0.25 -1.279 -1.203 -0.25 -0.438
  [3,15,-1.789,-0.25,-2.653,0.045,-0.25,-1.279,-1.203,-0.25,-0.438],
// 3 15 1.97 -0.25 -2.522 1.23 -0.25 -0.353 0.045 -0.25 -1.279
  [3,15,1.97,-0.25,-2.522,1.23,-0.25,-0.353,0.045,-0.25,-1.279],
// 4 15 12.888 -.25 3.198 12.212 -.25 1.009 13.045 -.25 -1.279 13.716 -.25 1.061
  [4,15,12.888,-.25,3.198,12.212,-.25,1.009,13.045,-.25,-1.279,13.716,-.25,1.061],
// 4 15 16.007 -.25 1.094 13.716 -.25 1.061 13.045 -.25 -1.279 14.23 -.25 -.353
  [4,15,16.007,-.25,1.094,13.716,-.25,1.061,13.045,-.25,-1.279,14.23,-.25,-.353],
// 4 15 9.924 -.25 .882 11.797 -.25 -.438 13.045 -.25 -1.279 12.212 -.25 1.009
  [4,15,9.924,-.25,.882,11.797,-.25,-.438,13.045,-.25,-1.279,12.212,-.25,1.009],
// 3 15 11.211 -0.25 -2.653 13.045 -0.25 -1.279 11.797 -0.25 -0.438
  [3,15,11.211,-0.25,-2.653,13.045,-0.25,-1.279,11.797,-0.25,-0.438],
// 3 15 14.97 -0.25 -2.522 14.23 -0.25 -0.353 13.045 -0.25 -1.279
  [3,15,14.97,-0.25,-2.522,14.23,-0.25,-0.353,13.045,-0.25,-1.279],
];
module ldraw_lib__168335r(step=0, col=false, unit=2/5, alt=false, line=0.2, solid=!$preview)
    makepoly(ldraw_lib__168335r(solid), step=step, col=col, unit=unit, alt=alt, line=line, solid=solid);
ldraw_lib__168335r(line=0.2);
